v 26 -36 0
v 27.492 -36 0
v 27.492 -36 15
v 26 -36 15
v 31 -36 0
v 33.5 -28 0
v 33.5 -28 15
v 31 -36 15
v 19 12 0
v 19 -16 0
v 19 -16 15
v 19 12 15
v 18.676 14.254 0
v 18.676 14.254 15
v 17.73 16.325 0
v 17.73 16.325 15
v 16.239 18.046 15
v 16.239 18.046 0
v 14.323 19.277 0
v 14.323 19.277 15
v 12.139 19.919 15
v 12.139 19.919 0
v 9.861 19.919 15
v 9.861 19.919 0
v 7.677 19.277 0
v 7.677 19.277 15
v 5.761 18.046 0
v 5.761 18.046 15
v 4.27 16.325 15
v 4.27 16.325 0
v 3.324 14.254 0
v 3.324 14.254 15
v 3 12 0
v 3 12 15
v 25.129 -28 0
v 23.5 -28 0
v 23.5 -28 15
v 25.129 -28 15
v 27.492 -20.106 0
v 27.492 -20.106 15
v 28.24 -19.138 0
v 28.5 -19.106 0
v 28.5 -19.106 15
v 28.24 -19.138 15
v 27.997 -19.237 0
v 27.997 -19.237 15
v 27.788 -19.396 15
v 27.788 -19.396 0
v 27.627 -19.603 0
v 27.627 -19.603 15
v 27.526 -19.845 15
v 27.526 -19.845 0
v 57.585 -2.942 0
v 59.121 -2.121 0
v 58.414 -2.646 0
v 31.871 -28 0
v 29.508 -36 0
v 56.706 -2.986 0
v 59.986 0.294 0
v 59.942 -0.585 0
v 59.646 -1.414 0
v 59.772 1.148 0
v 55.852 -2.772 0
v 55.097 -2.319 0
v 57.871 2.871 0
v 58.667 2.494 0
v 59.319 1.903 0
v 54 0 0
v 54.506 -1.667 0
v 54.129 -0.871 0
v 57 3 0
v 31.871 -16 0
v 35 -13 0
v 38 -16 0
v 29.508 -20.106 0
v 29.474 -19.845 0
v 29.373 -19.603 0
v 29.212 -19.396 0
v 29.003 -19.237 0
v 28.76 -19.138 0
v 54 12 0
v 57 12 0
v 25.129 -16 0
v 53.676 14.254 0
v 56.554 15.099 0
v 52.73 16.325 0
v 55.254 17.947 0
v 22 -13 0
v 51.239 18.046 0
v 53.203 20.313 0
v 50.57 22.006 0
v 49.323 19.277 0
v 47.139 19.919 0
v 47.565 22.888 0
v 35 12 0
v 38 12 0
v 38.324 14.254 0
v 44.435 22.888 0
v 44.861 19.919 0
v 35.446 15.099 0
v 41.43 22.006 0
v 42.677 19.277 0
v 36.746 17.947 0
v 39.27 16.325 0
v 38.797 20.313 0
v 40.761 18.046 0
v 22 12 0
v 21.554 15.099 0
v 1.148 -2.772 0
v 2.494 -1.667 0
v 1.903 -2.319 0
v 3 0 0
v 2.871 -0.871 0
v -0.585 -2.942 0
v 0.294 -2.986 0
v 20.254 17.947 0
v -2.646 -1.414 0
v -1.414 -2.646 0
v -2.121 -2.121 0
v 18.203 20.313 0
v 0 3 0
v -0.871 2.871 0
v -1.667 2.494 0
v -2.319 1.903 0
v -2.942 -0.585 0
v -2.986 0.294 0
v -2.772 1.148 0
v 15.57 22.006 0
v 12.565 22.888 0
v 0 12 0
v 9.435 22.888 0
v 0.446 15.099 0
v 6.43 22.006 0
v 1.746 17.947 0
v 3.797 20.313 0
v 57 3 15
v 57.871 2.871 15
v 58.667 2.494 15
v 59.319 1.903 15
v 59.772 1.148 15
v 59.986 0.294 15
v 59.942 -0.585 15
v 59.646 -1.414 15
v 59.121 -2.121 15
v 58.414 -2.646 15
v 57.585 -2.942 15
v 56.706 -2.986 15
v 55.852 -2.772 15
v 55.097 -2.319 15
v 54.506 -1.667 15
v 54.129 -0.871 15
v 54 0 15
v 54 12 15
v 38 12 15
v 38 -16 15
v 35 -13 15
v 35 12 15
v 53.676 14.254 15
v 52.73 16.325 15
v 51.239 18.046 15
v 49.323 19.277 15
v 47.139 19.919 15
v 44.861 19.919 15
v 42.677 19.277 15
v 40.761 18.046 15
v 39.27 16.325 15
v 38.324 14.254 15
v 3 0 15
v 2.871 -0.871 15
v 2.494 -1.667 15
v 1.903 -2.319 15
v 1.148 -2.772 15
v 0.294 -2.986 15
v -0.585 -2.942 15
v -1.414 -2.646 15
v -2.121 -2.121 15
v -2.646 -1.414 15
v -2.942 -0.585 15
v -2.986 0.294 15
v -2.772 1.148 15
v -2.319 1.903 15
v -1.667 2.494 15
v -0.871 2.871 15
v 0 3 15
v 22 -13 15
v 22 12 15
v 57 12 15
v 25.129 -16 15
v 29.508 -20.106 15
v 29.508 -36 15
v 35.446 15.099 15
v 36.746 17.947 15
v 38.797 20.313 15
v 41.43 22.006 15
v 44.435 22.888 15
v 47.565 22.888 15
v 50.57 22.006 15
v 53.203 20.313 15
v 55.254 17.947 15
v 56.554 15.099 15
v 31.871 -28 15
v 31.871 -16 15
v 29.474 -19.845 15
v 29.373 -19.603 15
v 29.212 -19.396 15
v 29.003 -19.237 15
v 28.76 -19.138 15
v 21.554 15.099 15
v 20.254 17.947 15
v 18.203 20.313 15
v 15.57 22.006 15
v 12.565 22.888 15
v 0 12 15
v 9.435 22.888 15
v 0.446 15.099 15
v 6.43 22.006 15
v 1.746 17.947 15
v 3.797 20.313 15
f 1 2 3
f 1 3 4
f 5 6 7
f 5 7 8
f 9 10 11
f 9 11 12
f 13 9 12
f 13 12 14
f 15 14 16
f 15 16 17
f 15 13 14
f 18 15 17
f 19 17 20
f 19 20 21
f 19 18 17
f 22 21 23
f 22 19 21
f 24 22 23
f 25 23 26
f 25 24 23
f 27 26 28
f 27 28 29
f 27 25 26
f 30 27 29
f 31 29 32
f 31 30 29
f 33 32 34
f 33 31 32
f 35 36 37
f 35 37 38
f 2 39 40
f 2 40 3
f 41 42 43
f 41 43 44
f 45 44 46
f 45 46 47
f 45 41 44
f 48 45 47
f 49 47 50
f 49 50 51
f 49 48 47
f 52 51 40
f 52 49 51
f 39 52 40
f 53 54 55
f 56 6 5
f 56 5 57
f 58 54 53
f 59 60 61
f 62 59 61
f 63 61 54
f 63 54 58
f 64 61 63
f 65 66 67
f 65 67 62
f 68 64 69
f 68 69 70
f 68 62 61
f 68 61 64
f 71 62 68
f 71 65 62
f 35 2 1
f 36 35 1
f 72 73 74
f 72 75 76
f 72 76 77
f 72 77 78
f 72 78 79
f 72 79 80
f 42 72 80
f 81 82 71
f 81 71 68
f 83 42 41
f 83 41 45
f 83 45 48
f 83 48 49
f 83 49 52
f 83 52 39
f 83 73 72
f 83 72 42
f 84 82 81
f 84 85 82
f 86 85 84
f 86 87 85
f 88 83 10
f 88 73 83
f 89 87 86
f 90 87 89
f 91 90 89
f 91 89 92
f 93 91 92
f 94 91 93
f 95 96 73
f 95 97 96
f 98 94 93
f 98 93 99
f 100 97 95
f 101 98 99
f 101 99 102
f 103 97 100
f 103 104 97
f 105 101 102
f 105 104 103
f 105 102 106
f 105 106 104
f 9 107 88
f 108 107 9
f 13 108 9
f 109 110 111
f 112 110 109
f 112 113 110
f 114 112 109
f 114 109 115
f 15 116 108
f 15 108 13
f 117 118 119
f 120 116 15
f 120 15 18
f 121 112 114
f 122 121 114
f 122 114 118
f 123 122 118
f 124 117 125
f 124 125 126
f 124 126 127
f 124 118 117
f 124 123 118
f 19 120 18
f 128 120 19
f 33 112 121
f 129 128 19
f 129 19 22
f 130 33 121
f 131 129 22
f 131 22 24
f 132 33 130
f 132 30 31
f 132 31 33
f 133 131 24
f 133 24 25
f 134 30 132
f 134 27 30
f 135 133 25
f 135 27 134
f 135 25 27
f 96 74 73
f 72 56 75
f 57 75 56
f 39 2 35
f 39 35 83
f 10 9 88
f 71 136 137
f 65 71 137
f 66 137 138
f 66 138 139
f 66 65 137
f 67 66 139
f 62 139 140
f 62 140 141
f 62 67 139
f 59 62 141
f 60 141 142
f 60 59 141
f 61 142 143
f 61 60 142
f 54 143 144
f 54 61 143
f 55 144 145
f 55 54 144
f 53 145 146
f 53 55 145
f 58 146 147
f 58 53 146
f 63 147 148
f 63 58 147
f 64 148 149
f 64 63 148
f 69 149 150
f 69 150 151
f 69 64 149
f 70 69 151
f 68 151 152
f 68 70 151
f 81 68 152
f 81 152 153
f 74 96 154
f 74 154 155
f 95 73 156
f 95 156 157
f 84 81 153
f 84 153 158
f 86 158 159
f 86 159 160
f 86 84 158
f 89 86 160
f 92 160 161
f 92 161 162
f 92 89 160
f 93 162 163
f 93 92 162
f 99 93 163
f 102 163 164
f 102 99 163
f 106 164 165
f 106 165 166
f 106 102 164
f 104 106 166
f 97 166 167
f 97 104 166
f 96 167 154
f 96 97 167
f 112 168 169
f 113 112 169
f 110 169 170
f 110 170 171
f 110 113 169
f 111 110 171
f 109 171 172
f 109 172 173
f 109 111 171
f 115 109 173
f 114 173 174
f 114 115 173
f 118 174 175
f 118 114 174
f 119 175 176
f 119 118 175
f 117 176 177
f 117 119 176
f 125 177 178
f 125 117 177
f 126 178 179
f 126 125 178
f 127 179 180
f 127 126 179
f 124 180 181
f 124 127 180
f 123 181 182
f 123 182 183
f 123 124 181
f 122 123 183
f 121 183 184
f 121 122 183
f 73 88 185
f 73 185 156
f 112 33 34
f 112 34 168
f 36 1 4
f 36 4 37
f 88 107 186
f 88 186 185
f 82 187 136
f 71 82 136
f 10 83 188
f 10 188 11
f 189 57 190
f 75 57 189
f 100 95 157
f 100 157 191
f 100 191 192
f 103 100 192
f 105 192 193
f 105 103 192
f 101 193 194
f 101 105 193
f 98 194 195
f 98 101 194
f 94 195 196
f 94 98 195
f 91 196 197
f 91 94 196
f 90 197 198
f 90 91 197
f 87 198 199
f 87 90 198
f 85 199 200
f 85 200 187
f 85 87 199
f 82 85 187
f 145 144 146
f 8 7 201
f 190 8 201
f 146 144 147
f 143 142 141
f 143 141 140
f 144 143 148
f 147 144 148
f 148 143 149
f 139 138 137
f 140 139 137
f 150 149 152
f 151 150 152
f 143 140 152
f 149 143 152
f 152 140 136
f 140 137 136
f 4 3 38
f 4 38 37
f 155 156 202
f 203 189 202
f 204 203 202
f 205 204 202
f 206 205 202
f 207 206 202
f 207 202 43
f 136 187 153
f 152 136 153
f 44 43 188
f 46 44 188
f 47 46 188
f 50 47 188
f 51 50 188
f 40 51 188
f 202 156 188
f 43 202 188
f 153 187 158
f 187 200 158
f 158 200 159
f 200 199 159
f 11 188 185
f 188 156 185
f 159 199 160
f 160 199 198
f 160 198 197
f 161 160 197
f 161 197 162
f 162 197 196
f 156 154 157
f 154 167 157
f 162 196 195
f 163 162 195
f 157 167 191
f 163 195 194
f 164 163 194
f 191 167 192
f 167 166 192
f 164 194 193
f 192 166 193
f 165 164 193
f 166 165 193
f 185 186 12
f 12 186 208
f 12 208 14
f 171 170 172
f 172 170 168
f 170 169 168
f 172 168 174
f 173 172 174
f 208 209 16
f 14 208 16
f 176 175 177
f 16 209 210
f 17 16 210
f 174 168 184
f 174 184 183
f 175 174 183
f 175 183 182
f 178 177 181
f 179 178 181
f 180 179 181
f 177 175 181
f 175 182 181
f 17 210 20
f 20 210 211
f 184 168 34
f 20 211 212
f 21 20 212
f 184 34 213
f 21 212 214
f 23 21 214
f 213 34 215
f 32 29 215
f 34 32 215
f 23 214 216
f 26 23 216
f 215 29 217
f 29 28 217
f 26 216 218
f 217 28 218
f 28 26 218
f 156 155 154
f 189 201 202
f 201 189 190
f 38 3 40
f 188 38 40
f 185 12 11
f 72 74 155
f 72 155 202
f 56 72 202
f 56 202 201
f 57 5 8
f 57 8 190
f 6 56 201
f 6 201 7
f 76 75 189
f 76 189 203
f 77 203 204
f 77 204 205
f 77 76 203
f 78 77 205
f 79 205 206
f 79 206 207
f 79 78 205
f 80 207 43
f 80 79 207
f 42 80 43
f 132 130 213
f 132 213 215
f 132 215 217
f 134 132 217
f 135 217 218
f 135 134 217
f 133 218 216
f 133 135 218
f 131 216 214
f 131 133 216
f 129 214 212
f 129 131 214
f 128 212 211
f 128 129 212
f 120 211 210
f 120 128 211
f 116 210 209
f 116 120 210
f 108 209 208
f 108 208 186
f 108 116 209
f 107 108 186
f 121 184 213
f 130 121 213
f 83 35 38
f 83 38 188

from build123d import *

# Parameters (mm, degrees)
BOSS_EXTRUDE1_DEPTH = 15


with BuildPart() as part:
    # Sketch1 → Boss-Extrude1 (new body)
    with BuildSketch(Plane.XY):
        with BuildLine():
            Line((0, 3), (0, 12))
            ThreePointArc((0, 12), (11, 23), (22, 12))
            Line((22, 12), (22, -13))
            Line((22, -13), (35, -13))
            Line((35, -13), (35, 12))
            ThreePointArc((35, 12), (46, 23), (57, 12))
            Line((57, 12), (57, 3))
            ThreePointArc((57, 3), (59.121320344, -2.121320344), (54, 0))
            Line((54, 0), (54, 12))
            ThreePointArc((54, 12), (46, 20), (38, 12))
            Line((38, 12), (38, -16))
            Line((38, -16), (31.871401461, -16))
            Line((31.871401461, -16), (31.871401461, -28))
            Line((31.871401461, -28), (33.5, -28))
            Line((33.5, -28), (31, -36))
            Line((31, -36), (29.507974066, -36))
            Line((29.507974066, -36), (29.507974066, -20.105540997))
            ThreePointArc((29.507974066, -20.105540997), (29.212255946, -19.395620555), (28.5, -19.10557279))
            ThreePointArc((28.5, -19.10557279), (27.787744054, -19.395620555), (27.492025934, -20.105540997))
            Line((27.492025934, -20.105540997), (27.492025934, -36))
            Line((27.492025934, -36), (26, -36))
            Line((26, -36), (23.5, -28))
            Line((23.5, -28), (25.128598539, -28))
            Line((25.128598539, -28), (25.128598539, -16))
            Line((25.128598539, -16), (19, -16))
            Line((19, -16), (19, 12))
            ThreePointArc((19, 12), (11, 20), (3, 12))
            Line((3, 12), (3, 0))
            ThreePointArc((3, 0), (-2.121320344, -2.121320344), (0, 3))
        make_face()
    extrude(amount=BOSS_EXTRUDE1_DEPTH)


solid = part.part
